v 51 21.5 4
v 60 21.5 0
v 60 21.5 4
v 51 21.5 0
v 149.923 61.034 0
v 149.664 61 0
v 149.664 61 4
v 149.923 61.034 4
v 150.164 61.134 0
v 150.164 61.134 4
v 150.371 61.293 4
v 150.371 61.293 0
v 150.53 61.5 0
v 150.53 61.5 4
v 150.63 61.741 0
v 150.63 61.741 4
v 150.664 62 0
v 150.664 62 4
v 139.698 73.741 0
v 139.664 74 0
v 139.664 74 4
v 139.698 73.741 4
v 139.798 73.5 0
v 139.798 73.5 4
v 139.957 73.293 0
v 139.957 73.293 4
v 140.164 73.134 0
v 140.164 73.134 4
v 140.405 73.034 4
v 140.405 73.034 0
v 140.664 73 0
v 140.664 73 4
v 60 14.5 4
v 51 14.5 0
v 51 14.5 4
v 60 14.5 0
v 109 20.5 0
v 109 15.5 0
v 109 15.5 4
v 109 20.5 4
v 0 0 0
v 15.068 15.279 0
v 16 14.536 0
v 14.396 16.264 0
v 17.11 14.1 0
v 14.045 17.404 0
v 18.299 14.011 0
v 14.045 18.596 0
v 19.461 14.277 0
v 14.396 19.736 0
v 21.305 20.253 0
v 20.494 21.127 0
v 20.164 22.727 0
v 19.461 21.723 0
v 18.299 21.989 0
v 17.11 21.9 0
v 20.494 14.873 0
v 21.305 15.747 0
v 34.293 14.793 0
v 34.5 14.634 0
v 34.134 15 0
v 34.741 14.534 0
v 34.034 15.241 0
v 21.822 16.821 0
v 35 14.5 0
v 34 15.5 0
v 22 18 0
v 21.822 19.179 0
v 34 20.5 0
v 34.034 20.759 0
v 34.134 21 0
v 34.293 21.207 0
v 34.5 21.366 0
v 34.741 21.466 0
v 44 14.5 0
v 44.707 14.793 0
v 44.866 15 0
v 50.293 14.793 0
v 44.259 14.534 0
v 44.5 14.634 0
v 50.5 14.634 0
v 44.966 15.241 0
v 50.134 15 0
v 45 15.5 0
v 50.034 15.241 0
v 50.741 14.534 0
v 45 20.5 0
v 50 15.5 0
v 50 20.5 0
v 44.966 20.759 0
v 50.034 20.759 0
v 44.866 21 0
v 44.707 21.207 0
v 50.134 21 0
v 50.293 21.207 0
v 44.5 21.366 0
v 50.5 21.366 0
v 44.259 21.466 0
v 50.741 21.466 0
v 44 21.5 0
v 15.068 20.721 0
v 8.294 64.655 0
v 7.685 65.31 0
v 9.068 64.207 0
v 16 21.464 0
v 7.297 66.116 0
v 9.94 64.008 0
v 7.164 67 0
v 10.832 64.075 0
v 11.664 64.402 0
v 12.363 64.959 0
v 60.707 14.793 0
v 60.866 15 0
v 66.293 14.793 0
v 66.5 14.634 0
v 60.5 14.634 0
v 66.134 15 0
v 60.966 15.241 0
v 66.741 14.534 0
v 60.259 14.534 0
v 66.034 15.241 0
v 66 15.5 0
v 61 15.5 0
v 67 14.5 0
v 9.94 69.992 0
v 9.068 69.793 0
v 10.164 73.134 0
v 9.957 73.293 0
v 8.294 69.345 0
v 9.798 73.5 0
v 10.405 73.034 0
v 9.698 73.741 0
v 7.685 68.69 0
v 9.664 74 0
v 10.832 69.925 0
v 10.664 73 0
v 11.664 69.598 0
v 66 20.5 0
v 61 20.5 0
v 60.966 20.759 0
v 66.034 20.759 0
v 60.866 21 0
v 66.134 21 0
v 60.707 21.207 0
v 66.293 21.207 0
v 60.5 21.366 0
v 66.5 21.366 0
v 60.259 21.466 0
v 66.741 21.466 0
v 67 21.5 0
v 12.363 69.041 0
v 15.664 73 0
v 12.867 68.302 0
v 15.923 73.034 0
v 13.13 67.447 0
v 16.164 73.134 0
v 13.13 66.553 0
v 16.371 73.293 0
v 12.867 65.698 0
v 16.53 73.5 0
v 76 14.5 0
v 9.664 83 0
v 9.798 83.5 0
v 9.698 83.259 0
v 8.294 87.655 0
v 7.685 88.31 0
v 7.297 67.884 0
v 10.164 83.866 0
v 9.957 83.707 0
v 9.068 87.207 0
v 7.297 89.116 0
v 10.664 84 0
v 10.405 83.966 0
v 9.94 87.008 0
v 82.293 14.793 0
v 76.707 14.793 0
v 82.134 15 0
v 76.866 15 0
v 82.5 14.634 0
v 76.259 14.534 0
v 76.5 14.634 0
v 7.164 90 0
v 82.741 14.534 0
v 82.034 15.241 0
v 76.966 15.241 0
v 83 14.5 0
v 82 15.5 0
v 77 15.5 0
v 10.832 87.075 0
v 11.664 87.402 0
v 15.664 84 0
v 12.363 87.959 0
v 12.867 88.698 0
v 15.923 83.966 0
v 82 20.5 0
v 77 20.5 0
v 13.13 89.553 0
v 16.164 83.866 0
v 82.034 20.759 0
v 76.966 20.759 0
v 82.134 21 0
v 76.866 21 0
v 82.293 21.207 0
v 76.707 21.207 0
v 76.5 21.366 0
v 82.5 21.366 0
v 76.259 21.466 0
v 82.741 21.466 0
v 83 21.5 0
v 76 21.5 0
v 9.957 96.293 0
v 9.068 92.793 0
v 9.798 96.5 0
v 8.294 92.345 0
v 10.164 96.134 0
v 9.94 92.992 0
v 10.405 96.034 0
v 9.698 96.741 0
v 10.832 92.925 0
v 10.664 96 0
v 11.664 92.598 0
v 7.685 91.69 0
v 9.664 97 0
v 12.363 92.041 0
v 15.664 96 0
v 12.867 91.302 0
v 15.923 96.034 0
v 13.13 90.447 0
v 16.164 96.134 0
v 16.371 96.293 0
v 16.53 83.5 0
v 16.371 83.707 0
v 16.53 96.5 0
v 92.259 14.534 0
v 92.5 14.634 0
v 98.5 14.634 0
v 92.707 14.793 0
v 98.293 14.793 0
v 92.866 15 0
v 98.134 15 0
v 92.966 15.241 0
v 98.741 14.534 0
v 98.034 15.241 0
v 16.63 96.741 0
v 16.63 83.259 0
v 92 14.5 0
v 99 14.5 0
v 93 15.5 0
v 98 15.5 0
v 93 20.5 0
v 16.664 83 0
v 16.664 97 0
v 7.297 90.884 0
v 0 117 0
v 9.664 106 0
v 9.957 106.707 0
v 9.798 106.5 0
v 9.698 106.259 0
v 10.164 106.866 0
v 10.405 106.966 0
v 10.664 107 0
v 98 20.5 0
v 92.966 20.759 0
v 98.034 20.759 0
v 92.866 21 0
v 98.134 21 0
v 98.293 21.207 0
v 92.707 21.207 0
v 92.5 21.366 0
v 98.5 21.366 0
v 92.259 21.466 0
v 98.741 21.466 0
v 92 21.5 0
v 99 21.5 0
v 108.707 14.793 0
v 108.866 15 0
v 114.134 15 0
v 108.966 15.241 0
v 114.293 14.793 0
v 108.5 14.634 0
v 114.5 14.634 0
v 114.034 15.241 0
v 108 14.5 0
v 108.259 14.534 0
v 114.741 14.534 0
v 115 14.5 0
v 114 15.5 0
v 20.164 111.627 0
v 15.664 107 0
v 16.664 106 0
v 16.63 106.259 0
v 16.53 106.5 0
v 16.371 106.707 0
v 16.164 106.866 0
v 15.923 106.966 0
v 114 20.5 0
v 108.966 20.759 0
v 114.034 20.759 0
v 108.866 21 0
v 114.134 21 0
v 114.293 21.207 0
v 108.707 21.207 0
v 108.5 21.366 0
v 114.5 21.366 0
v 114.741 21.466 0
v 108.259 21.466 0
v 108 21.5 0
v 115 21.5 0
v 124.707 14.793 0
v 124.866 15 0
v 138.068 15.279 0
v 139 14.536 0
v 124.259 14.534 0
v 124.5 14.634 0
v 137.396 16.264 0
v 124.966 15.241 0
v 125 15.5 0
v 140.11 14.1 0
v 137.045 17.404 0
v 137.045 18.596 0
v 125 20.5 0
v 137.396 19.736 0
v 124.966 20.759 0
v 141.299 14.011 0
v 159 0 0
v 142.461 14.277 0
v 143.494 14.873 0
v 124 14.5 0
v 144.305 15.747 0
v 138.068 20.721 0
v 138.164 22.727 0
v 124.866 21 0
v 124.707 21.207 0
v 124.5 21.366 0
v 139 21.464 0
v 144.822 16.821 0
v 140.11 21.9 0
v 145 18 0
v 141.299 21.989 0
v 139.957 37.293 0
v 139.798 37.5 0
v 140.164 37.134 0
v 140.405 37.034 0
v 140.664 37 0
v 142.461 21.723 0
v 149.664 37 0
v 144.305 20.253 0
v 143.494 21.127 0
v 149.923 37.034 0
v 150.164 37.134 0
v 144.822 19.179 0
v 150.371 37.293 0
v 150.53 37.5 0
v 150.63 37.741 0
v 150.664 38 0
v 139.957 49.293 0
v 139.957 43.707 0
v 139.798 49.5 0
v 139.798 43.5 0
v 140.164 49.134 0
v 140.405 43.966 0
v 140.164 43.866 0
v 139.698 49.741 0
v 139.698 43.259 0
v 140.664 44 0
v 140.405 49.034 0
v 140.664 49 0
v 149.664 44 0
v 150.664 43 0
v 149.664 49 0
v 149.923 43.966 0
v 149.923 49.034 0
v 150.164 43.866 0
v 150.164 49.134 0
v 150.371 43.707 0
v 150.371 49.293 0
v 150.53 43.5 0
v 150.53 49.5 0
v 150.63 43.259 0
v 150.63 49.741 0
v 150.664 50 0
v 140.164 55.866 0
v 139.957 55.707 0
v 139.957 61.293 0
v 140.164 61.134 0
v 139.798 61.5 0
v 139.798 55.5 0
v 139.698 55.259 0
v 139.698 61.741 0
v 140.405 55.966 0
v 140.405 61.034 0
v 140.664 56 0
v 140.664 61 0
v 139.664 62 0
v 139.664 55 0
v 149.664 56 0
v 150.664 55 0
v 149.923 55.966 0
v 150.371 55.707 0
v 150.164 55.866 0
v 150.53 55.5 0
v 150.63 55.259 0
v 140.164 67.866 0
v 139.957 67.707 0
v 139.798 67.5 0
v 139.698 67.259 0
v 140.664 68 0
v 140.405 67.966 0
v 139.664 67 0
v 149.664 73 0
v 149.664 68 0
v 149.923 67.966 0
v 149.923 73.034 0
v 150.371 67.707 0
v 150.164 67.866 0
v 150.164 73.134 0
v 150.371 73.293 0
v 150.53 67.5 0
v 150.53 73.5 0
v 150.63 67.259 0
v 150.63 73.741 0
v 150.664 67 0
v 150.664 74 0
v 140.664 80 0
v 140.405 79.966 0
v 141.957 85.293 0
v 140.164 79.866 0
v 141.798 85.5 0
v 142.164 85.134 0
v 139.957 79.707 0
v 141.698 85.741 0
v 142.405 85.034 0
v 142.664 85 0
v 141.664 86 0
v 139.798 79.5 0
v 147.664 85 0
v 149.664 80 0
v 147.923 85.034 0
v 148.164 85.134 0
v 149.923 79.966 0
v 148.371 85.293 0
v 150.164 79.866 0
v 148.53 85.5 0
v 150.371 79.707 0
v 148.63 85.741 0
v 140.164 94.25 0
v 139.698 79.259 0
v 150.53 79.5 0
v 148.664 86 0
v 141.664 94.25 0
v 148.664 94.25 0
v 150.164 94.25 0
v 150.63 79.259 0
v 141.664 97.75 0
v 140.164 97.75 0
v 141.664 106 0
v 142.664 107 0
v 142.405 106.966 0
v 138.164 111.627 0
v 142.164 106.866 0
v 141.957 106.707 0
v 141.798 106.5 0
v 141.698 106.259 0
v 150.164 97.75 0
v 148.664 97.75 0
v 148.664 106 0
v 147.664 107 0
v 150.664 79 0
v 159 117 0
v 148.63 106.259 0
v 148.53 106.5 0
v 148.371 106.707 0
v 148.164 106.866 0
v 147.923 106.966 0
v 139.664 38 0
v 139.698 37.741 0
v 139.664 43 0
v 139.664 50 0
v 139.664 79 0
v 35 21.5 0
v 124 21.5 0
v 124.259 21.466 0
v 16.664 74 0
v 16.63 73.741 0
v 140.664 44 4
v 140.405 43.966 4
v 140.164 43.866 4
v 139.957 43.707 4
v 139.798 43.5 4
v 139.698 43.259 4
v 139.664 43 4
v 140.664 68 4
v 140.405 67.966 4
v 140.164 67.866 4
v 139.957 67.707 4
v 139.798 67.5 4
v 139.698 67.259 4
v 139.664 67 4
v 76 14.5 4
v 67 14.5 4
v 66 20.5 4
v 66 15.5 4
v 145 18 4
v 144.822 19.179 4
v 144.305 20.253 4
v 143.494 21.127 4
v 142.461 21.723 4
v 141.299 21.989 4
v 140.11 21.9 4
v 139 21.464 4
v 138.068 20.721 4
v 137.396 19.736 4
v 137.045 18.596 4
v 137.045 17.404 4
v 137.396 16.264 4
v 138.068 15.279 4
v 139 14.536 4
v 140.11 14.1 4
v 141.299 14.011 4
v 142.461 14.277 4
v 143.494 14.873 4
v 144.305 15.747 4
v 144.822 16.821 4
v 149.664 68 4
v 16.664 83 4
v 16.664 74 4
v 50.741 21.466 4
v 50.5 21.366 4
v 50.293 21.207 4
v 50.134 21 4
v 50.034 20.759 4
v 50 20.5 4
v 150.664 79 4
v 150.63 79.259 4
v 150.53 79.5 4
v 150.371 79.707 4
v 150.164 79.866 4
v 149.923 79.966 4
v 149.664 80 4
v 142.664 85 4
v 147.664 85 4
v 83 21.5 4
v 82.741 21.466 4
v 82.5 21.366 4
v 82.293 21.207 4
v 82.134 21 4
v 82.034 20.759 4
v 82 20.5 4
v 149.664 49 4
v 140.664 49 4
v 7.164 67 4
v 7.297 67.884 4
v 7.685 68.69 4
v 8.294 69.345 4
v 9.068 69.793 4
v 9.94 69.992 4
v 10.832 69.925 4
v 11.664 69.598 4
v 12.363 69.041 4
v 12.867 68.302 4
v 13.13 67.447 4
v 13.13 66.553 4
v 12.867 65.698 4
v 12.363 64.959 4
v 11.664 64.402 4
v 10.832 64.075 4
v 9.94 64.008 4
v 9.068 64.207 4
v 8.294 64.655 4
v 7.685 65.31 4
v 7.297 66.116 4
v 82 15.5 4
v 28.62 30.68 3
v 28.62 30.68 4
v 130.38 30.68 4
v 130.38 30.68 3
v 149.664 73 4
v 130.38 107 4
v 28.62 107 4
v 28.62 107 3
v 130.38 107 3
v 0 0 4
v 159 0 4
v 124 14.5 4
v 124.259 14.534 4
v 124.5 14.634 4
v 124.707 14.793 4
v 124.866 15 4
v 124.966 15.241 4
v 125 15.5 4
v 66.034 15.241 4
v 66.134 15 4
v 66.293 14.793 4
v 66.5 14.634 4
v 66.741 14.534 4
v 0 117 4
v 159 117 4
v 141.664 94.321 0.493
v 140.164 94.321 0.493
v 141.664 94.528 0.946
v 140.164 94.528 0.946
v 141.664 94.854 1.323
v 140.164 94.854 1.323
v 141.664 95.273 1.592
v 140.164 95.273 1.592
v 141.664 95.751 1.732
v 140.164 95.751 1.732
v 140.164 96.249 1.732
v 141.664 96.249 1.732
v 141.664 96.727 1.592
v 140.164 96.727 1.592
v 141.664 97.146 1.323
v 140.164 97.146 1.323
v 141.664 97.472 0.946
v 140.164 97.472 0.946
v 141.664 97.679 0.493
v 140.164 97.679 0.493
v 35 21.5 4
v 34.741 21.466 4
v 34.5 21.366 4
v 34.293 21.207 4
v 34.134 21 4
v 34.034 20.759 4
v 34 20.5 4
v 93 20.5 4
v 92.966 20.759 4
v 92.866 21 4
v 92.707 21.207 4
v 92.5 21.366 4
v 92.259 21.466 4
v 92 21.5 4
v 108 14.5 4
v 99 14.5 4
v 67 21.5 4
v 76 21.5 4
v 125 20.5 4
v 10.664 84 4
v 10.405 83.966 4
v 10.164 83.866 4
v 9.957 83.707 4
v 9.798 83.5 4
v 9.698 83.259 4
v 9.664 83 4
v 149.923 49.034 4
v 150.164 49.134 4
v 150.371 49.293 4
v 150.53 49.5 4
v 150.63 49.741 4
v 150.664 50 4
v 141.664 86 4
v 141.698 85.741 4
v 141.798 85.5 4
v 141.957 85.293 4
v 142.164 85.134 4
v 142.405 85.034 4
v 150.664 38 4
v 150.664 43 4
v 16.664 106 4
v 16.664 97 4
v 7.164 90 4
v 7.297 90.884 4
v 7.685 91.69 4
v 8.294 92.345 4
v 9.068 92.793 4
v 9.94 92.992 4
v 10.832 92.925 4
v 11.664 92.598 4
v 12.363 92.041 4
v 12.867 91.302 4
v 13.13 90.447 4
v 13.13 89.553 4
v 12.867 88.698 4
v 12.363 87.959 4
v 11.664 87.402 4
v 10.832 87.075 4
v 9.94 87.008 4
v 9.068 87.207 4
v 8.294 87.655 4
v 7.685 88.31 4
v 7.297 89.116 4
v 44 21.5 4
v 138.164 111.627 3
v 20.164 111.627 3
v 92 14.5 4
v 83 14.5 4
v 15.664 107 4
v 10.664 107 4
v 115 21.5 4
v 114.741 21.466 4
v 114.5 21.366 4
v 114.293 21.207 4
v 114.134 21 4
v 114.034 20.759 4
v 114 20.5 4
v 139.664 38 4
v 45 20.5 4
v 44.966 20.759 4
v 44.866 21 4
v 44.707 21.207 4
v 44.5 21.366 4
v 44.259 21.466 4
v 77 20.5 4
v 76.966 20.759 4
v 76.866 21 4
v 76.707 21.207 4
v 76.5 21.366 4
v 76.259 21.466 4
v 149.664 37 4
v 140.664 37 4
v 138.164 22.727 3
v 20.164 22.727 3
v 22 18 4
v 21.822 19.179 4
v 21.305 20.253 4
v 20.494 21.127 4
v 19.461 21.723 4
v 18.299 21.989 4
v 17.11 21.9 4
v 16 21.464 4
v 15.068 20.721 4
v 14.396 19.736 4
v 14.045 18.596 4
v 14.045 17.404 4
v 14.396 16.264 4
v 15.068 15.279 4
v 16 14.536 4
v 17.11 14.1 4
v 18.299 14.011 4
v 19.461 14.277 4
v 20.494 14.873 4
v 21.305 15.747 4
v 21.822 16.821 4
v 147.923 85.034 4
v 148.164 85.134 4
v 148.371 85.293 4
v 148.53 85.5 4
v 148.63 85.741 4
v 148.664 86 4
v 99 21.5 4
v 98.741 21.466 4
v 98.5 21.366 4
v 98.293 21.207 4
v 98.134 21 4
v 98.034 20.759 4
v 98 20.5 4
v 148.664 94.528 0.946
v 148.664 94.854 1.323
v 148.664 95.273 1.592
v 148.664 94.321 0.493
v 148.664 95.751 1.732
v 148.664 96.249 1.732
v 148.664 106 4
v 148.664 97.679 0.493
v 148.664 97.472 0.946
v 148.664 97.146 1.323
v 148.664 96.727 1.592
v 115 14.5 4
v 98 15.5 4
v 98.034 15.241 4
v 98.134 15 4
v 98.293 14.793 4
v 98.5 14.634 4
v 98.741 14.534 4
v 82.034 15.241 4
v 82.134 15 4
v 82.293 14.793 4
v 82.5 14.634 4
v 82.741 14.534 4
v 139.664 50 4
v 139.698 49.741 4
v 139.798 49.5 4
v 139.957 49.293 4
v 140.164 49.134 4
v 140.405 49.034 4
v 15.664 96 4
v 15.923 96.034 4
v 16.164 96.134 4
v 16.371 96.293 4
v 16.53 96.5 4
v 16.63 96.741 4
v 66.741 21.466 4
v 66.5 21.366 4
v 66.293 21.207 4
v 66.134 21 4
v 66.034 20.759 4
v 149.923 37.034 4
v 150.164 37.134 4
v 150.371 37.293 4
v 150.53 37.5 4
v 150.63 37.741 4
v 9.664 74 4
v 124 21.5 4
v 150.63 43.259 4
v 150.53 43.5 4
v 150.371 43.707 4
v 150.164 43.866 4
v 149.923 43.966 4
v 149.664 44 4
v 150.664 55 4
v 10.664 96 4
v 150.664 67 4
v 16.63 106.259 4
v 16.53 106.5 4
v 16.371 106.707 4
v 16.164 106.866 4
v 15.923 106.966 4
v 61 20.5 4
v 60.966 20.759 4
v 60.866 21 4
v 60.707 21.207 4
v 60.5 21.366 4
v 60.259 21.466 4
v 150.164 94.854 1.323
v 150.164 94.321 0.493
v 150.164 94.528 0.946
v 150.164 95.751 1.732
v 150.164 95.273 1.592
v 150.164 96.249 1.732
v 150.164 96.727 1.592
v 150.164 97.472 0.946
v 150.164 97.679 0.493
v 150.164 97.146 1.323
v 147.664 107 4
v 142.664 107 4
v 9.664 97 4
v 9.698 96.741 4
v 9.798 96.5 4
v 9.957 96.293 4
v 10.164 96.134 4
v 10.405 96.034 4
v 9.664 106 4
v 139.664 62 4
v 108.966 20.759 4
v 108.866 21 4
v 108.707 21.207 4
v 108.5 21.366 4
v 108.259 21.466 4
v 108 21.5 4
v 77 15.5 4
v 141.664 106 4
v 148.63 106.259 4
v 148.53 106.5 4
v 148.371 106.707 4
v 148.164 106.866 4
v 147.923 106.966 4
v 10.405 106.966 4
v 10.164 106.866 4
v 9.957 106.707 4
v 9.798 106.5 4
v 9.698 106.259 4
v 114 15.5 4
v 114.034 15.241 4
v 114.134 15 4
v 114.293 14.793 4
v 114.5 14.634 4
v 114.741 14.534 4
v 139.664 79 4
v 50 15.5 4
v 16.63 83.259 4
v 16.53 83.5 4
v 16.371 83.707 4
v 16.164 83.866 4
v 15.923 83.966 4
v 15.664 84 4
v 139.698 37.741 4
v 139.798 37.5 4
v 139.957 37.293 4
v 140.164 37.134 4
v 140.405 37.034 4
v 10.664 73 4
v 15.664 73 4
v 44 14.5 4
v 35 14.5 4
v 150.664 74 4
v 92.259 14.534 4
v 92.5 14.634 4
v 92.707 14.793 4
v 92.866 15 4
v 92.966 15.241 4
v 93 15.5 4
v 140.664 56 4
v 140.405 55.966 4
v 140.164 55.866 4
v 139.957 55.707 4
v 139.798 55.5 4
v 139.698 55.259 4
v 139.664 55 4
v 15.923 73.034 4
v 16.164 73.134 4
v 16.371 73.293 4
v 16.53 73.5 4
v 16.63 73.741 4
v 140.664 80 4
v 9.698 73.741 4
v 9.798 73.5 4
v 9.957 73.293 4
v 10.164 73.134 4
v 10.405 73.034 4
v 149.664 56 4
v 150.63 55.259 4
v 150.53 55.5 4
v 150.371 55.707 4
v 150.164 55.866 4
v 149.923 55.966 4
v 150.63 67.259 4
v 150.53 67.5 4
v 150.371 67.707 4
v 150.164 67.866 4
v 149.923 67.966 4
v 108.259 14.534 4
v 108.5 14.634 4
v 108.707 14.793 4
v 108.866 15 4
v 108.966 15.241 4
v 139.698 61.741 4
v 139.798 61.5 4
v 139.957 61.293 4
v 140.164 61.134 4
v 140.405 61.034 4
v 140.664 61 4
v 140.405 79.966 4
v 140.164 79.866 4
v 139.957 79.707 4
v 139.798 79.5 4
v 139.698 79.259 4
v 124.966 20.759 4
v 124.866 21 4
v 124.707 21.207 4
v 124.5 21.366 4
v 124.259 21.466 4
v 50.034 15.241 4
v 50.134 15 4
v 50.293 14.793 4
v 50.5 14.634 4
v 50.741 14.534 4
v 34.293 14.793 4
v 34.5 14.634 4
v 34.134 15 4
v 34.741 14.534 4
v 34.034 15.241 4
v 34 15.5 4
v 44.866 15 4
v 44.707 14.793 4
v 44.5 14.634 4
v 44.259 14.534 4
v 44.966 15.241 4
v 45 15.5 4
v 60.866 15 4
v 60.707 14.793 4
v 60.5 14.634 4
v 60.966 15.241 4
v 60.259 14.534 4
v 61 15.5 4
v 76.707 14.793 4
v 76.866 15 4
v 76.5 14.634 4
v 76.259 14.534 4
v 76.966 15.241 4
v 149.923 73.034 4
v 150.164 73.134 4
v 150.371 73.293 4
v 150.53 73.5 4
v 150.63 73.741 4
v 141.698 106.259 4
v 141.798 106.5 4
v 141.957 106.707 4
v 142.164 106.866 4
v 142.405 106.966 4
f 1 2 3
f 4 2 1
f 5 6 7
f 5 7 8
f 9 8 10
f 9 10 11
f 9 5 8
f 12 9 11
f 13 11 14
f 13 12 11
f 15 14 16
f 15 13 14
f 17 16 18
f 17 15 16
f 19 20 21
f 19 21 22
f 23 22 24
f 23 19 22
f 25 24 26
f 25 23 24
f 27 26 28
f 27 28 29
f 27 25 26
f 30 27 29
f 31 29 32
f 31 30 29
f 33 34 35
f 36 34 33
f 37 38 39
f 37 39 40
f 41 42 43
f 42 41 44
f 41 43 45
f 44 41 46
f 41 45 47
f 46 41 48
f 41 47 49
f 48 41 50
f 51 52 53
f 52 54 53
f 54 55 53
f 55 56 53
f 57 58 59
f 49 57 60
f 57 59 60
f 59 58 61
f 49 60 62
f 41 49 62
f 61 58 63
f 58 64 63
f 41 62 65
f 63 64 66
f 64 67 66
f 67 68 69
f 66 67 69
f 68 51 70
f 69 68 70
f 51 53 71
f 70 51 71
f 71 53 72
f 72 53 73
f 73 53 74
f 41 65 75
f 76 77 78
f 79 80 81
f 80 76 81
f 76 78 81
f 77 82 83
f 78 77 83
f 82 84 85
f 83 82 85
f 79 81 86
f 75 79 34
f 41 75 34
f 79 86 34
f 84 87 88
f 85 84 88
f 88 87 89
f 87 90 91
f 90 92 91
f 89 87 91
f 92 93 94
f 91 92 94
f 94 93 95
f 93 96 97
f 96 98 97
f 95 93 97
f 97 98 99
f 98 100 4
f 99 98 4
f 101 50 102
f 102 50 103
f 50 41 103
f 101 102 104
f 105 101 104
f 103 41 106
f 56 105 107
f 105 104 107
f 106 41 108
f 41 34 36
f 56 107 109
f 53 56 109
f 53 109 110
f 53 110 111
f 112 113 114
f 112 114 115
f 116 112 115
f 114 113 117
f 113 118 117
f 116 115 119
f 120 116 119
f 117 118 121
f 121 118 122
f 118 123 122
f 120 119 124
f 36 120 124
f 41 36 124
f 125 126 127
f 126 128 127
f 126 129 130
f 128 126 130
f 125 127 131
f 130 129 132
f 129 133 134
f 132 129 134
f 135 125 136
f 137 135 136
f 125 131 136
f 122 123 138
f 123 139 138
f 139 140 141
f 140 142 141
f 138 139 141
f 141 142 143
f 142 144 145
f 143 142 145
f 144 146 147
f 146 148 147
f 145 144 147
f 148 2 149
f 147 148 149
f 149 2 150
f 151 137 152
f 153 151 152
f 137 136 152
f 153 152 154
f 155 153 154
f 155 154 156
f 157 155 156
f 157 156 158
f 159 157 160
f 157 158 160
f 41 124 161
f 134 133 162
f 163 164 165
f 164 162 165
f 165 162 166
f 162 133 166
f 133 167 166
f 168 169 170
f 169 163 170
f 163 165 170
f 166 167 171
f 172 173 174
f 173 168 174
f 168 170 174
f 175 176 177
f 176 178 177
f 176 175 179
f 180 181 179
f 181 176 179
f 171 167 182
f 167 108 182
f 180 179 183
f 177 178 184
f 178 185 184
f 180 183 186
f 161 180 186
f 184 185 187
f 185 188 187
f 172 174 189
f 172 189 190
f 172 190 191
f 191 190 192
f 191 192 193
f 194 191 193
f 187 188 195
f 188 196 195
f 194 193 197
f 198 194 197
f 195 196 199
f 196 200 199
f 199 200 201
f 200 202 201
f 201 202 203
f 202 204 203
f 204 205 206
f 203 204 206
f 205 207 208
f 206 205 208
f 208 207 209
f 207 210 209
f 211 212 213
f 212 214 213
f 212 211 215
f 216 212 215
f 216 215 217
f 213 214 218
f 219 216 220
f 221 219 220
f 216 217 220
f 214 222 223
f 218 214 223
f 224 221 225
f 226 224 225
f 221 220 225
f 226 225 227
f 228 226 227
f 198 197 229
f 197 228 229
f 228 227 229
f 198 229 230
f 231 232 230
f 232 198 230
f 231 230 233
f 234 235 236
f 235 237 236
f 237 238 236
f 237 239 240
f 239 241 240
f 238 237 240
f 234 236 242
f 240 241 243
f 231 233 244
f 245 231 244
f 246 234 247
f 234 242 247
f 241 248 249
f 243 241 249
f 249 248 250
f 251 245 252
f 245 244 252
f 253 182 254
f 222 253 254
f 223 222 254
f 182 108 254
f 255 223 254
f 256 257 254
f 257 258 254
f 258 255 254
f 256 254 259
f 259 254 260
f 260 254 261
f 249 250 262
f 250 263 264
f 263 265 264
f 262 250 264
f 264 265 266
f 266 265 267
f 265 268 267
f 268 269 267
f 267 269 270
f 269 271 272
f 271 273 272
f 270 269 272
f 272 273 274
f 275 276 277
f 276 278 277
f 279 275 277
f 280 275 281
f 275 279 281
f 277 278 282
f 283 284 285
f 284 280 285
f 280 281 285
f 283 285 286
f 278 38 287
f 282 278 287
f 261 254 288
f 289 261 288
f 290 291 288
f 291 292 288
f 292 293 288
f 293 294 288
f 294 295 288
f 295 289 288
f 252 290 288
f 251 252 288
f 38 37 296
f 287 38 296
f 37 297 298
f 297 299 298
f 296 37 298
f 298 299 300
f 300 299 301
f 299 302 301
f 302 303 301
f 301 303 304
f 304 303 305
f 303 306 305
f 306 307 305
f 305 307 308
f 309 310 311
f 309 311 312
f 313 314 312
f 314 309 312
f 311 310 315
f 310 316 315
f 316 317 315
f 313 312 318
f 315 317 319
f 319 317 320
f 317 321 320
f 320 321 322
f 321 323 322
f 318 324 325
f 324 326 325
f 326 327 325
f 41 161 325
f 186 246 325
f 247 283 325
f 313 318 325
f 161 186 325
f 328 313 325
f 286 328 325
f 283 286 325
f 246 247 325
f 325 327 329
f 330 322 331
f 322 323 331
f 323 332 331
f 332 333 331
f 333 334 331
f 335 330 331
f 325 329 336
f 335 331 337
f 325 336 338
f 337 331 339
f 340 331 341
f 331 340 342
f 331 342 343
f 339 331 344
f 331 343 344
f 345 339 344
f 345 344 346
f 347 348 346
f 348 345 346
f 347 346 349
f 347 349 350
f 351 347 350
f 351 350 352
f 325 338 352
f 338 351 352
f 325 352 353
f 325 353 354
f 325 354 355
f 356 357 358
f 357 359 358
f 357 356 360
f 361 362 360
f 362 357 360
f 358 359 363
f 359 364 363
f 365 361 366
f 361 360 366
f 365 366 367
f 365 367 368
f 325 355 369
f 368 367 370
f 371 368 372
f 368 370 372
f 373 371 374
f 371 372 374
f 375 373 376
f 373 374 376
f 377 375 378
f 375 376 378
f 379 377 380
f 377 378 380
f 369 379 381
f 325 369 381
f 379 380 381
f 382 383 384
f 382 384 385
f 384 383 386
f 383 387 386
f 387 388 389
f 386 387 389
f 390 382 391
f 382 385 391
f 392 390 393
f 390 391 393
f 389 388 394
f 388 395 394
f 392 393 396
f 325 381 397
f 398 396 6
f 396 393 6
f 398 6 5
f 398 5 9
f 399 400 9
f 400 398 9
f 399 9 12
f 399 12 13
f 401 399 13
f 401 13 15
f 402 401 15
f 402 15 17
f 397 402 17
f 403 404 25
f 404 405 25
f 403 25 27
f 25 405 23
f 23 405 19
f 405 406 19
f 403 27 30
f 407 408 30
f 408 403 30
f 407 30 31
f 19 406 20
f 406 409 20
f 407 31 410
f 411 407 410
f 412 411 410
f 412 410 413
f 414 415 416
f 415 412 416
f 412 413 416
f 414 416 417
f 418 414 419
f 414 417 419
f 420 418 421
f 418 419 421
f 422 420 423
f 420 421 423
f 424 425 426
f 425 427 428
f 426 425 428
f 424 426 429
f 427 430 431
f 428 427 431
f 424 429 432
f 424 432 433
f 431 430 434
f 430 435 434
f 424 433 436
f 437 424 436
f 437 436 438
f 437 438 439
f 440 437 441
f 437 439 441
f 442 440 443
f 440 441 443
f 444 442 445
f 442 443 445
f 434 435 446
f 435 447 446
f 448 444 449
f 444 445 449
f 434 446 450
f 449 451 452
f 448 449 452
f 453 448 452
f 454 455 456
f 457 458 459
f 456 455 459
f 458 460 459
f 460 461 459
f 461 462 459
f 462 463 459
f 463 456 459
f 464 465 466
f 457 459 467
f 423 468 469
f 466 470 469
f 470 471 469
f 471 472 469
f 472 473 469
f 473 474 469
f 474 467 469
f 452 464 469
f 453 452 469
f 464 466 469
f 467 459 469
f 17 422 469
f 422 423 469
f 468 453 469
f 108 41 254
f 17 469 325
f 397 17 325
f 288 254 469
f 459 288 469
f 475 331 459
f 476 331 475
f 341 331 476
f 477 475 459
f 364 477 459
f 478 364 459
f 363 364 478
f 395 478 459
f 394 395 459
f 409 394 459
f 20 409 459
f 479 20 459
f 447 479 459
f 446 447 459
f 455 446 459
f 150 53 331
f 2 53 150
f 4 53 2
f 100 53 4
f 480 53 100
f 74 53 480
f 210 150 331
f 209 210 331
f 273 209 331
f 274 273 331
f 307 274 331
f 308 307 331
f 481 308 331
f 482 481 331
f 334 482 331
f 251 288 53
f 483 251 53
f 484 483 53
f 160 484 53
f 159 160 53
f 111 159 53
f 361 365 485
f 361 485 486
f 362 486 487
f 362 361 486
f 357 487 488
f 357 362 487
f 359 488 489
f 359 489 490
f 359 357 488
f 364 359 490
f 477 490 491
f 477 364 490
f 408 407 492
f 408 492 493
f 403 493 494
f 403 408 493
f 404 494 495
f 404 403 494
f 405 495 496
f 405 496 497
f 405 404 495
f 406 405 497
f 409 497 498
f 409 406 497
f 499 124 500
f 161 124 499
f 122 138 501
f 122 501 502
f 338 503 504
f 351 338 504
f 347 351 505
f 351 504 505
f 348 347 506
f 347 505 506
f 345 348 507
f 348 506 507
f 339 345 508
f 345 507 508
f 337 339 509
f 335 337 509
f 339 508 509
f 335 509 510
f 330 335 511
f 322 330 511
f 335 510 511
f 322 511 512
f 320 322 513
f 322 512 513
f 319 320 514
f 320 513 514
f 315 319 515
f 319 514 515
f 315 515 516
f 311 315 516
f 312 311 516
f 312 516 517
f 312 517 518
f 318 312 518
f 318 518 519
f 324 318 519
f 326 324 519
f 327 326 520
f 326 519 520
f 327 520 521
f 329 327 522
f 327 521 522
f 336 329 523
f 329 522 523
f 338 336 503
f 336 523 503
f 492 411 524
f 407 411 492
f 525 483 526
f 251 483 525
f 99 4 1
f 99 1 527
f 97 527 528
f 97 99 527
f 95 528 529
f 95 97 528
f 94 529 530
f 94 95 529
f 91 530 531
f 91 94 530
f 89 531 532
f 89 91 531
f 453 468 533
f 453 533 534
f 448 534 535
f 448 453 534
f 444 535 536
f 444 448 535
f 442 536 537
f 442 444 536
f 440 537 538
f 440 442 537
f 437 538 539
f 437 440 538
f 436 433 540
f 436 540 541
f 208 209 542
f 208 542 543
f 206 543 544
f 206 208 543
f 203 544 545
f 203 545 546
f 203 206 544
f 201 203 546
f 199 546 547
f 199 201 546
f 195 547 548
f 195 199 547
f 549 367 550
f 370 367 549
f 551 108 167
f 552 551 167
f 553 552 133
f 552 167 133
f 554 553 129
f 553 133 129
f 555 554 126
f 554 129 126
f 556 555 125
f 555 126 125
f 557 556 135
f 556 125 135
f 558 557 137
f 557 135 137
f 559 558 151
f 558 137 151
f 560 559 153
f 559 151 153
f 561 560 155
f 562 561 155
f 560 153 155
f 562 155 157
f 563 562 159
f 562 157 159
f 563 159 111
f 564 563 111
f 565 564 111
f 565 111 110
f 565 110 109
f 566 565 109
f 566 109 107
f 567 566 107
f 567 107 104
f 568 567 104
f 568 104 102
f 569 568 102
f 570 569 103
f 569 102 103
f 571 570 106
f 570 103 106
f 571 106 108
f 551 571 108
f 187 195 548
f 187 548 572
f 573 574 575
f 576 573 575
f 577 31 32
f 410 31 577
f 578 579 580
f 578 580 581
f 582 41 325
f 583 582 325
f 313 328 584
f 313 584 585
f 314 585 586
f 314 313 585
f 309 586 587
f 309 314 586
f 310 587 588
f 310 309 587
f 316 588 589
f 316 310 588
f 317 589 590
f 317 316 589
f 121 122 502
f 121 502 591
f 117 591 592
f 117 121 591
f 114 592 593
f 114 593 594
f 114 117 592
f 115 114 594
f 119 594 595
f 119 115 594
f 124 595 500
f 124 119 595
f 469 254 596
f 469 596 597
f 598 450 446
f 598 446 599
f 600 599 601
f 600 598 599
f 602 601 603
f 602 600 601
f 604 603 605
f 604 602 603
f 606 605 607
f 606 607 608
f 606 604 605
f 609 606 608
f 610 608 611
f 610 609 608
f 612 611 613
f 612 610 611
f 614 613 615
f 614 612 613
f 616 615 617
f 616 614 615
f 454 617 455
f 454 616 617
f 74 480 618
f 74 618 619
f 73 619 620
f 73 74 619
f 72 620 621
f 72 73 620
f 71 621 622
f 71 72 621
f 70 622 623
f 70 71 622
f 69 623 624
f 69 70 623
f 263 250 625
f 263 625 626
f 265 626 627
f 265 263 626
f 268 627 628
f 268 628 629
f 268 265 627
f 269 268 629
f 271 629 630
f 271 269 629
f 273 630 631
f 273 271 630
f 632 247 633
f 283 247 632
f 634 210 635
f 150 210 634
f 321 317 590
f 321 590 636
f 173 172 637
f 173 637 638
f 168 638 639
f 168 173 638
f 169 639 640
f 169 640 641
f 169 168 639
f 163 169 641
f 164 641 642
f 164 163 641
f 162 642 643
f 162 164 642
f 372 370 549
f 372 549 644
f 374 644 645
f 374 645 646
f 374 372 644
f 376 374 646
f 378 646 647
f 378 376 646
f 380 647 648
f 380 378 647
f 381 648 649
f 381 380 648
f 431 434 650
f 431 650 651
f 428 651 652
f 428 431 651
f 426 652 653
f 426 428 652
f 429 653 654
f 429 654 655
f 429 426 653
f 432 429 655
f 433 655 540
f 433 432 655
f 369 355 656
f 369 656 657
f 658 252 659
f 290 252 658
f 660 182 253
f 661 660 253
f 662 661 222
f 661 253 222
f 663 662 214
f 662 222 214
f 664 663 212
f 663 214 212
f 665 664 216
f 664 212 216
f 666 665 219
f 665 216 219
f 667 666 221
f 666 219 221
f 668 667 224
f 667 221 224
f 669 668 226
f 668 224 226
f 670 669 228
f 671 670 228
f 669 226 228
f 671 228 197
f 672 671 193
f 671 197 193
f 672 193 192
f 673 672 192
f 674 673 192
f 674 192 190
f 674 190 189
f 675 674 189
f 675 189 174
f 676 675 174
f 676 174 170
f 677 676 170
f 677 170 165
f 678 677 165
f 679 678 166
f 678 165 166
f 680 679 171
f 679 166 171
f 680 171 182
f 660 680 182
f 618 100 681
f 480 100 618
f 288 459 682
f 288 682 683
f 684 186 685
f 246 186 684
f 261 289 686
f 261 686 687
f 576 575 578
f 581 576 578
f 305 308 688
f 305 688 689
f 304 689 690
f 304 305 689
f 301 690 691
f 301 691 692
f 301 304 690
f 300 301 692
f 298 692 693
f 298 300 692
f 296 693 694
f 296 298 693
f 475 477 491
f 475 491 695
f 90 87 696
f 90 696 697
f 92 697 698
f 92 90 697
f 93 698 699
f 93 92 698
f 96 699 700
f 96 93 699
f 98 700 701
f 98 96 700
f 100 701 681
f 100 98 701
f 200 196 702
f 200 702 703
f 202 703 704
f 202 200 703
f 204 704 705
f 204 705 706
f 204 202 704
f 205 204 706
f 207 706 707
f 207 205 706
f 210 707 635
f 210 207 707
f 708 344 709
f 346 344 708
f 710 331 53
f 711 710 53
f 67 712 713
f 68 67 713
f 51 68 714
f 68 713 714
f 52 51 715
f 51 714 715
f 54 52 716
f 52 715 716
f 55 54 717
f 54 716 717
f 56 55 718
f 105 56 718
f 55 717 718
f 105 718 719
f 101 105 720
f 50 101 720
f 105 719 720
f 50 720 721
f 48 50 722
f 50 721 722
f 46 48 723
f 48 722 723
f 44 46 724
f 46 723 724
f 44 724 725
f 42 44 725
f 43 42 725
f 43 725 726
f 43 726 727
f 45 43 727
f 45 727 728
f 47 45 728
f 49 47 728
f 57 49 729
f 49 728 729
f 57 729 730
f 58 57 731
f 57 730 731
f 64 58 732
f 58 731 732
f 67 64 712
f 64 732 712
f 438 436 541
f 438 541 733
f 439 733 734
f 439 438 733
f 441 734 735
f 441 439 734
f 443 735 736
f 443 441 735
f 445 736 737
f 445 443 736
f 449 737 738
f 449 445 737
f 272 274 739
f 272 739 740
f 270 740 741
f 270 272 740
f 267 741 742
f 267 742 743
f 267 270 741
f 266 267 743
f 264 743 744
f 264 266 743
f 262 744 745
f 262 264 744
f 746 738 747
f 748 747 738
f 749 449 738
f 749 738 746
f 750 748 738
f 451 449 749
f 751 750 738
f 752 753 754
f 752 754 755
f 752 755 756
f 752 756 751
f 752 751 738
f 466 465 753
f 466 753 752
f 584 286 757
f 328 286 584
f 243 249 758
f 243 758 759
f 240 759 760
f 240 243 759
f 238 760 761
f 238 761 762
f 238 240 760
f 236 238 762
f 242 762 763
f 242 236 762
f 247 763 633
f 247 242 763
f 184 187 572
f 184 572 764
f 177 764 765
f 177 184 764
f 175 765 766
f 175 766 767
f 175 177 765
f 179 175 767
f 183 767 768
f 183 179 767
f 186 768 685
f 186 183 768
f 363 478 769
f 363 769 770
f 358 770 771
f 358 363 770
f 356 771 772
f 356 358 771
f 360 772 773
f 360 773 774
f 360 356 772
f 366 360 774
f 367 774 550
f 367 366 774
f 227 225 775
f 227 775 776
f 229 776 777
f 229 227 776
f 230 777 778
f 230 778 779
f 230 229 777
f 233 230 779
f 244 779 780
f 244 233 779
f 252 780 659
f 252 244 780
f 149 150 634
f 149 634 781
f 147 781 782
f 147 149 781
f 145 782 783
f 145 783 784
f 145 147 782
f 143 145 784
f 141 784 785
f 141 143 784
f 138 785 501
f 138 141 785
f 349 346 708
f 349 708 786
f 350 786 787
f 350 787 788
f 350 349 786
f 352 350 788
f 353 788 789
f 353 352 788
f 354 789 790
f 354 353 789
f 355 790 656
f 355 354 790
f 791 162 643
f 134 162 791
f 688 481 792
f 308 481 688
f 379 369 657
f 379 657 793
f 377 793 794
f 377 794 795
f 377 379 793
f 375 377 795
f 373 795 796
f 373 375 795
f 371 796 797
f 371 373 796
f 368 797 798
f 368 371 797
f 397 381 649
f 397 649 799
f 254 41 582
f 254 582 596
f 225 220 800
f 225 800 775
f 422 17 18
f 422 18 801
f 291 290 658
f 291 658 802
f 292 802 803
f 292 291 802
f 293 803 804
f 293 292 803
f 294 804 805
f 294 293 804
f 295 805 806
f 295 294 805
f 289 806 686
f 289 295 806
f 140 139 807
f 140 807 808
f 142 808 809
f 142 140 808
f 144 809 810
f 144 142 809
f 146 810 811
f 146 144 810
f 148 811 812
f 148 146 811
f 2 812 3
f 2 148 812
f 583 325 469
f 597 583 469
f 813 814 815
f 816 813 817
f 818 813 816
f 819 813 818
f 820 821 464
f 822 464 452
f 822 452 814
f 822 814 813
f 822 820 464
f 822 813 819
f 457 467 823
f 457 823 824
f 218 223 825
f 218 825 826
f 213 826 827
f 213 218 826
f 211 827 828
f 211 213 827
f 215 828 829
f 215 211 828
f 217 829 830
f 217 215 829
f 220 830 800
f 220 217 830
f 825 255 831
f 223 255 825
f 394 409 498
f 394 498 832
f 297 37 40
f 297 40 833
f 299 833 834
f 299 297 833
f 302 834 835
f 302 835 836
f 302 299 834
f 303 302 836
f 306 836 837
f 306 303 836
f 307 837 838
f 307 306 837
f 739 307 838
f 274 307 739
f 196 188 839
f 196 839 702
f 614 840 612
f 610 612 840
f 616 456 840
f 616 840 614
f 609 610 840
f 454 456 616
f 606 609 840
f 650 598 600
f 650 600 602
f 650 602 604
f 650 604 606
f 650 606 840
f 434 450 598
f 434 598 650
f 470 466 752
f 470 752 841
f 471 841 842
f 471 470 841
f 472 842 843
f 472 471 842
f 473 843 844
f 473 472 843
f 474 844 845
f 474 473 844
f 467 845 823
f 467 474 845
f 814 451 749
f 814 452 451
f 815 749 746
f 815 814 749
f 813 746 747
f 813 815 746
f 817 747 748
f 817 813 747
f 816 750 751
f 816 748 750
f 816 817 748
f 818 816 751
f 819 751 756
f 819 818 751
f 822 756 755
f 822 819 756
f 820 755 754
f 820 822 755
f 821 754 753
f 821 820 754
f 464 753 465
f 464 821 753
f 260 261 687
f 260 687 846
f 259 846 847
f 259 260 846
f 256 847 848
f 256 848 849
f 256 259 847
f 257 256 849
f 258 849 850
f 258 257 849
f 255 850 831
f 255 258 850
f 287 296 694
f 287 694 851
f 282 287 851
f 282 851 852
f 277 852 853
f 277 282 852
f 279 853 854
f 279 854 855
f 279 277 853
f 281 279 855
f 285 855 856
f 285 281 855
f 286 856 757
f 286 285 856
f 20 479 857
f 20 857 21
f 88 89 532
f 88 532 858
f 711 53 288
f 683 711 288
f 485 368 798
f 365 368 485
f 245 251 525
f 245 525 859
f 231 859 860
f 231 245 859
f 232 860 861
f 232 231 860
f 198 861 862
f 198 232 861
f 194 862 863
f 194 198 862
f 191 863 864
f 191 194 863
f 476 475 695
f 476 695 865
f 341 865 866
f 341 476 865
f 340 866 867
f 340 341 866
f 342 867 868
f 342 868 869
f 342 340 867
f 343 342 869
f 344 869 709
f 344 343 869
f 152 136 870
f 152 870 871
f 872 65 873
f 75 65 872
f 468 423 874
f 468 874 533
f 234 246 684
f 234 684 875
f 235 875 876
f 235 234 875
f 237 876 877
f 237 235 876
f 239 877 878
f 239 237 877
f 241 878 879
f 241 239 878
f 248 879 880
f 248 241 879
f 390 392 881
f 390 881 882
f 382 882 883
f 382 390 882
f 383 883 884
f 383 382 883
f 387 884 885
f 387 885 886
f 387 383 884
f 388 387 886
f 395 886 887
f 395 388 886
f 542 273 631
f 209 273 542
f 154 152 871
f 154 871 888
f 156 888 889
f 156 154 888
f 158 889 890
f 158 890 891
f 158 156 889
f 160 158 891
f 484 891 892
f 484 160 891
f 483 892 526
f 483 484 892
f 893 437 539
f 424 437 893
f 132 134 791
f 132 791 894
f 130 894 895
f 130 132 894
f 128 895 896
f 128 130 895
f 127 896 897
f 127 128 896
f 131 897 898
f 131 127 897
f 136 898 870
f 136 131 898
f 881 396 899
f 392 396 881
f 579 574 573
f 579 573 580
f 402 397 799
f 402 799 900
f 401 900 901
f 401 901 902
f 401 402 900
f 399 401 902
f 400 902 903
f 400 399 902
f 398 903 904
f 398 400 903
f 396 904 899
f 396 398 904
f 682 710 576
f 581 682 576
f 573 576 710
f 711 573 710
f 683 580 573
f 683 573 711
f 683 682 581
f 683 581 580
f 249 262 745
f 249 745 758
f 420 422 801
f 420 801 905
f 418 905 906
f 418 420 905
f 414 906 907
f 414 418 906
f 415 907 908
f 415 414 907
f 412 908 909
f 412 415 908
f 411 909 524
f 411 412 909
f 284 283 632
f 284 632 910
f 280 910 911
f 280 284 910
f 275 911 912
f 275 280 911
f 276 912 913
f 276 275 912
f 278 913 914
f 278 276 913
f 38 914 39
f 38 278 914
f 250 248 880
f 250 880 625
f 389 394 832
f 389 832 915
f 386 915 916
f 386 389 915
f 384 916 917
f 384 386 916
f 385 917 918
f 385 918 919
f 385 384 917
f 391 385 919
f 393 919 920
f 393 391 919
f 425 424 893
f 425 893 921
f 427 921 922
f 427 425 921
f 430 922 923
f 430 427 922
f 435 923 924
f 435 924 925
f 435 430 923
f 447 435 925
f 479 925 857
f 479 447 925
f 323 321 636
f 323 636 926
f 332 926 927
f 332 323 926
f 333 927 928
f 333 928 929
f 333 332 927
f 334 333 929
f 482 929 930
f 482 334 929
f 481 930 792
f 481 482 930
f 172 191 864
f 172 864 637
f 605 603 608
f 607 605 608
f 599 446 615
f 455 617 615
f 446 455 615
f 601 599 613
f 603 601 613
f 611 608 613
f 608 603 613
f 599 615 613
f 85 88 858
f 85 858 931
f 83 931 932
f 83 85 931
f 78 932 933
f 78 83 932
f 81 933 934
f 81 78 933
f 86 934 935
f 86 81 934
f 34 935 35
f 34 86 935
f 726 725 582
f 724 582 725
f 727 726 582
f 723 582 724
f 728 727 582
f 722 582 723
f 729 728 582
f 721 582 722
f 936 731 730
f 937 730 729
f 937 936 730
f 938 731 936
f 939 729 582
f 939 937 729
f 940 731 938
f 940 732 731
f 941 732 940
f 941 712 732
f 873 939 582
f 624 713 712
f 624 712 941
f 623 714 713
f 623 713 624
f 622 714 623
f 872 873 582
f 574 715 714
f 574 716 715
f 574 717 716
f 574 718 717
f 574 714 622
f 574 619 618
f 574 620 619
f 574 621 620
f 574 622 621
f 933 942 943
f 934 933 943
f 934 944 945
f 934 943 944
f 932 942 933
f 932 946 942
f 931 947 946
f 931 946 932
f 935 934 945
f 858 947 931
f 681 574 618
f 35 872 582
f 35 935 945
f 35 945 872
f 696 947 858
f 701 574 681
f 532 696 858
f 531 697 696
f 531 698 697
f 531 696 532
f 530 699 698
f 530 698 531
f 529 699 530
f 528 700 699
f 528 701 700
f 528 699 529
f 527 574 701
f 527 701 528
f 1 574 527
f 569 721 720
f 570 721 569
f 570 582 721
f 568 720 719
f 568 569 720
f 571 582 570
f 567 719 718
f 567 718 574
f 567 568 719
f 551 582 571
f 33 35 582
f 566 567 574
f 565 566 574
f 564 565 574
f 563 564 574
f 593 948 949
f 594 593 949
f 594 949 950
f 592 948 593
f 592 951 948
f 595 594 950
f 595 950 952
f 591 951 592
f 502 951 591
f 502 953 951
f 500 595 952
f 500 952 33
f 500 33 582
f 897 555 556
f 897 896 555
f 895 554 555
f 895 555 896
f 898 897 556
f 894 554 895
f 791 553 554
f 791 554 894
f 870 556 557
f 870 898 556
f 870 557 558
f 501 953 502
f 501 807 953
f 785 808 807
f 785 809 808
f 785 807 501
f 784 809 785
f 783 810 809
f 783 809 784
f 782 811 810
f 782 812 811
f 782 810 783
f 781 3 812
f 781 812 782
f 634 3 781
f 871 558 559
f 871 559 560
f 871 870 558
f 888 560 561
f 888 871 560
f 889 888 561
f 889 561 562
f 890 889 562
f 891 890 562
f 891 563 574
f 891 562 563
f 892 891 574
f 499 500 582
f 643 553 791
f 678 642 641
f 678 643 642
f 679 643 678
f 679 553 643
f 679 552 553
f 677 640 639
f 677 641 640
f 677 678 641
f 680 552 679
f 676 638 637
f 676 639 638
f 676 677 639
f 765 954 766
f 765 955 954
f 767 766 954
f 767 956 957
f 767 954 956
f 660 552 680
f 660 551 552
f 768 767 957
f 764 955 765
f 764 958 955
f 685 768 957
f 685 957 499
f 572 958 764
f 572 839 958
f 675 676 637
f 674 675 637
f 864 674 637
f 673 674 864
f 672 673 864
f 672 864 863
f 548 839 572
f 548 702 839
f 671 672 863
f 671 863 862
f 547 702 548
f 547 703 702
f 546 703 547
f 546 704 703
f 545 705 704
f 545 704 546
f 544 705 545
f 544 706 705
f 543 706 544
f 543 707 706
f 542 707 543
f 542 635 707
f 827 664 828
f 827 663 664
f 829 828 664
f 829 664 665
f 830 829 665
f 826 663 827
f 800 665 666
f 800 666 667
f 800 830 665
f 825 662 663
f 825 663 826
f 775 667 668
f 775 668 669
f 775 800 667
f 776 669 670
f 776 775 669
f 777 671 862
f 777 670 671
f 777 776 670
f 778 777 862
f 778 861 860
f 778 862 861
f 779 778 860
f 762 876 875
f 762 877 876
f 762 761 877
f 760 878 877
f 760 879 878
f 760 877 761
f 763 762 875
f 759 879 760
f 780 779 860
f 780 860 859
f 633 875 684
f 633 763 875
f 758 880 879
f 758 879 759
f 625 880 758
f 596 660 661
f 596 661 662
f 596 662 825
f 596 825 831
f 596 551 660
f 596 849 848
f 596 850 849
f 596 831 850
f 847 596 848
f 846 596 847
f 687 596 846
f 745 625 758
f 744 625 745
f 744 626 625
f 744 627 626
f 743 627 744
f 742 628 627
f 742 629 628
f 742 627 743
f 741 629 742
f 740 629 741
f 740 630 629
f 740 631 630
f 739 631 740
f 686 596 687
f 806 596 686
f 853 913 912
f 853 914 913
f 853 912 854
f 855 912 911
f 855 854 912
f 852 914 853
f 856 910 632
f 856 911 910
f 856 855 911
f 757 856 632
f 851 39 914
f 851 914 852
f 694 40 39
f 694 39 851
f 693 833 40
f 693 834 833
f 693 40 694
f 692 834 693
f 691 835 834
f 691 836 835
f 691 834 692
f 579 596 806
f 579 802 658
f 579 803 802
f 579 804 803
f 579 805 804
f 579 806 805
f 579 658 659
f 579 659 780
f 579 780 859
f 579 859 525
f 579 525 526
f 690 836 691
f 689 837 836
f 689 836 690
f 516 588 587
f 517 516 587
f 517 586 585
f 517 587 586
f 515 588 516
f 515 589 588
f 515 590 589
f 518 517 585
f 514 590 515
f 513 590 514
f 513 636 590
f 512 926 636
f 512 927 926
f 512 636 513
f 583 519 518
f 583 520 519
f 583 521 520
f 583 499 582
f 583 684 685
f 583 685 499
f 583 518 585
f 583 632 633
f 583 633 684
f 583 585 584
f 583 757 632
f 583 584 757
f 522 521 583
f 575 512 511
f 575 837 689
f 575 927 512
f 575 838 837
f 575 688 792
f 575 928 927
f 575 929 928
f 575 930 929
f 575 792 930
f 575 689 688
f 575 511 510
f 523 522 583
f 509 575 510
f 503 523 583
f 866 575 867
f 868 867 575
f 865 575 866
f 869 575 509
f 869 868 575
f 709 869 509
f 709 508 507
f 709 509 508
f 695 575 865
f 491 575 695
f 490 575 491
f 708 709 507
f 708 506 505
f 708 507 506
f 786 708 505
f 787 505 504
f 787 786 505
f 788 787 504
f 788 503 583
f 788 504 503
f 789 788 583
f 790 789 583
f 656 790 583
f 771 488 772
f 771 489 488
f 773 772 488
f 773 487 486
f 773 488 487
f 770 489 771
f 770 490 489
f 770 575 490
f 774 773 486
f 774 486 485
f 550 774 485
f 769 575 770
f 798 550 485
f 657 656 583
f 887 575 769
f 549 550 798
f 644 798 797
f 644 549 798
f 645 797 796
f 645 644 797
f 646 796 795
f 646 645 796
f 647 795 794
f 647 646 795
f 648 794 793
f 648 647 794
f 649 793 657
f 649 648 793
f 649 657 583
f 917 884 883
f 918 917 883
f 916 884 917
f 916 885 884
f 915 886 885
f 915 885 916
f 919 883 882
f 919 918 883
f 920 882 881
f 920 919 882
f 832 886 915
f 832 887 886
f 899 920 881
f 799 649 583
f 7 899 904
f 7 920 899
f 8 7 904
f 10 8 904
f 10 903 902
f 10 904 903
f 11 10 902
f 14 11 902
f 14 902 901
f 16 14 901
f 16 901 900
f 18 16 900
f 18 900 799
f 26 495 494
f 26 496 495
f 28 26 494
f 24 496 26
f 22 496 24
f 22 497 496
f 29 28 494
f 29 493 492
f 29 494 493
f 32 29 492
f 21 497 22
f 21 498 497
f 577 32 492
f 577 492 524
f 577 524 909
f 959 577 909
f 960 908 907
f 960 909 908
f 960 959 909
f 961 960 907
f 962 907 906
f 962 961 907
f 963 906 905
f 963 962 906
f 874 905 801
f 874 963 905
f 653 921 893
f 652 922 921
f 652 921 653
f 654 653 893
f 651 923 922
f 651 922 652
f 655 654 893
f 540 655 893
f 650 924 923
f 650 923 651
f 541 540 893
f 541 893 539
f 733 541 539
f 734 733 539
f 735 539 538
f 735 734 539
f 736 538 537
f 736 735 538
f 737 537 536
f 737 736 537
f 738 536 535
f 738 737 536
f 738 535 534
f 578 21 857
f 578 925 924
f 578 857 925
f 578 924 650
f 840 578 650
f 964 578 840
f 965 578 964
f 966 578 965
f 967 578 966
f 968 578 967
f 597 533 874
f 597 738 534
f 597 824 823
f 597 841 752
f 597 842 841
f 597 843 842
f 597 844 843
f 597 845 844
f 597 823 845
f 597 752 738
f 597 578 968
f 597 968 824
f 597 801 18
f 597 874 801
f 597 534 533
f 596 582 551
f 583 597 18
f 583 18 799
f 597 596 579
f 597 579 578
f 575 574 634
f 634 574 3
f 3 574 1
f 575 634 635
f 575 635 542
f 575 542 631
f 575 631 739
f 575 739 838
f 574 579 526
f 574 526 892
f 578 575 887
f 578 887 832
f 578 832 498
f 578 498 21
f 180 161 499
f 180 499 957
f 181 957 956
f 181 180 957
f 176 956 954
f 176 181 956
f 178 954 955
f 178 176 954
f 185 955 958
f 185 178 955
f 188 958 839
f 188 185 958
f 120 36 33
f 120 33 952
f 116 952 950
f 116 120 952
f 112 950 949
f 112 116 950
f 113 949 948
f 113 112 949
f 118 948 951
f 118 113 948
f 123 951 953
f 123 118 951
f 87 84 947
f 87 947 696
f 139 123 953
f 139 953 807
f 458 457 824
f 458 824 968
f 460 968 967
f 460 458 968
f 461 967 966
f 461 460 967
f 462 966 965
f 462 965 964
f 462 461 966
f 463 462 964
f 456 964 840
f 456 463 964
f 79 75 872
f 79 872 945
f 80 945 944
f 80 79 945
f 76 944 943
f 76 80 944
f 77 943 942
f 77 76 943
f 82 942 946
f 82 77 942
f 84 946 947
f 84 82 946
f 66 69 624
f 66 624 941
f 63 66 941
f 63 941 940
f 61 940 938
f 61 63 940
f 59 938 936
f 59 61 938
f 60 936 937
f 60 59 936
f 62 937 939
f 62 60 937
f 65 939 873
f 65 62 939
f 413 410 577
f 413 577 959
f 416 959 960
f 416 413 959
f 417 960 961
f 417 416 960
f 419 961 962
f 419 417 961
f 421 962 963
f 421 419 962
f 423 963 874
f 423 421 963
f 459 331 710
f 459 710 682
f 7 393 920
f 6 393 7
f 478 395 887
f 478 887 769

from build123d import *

# Parameters (mm, degrees)
ESQUISSE1_W                  = 159
ESQUISSE1_H                  = 117
BOSS_EXTRU_1_DEPTH           = 4
ESQUISSE3_W                  = 101.76
ESQUISSE3_H                  = 76.32
ENL_V_MAT_EXTRU_2_DEPTH      = 4
ESQUISSE9_W                  = 118
ESQUISSE9_H                  = 88.9
ENL_V_MAT_EXTRU_5_DEPTH      = 3
ESQUISSE4_R                  = 4
ENL_V_MAT_EXTRU_3_DEPTH      = 4
ESQUISSE10_R                 = 3
ENL_V_MAT_EXTRU_6_DEPTH      = 4
ENL_V_MAT_EXTRU_7_DEPTH      = 8.5
ENL_V_MAT_EXTRU_7_DEPTH_BACK = 1.5
ESQUISSE11_R                 = 1.75


with BuildPart() as part:
    # Esquisse1 → Boss.-Extru.1 (new body)
    with BuildSketch(Plane.XY):
        with Locations((79.5, 58.5)):
            Rectangle(ESQUISSE1_W, ESQUISSE1_H)
    extrude(amount=BOSS_EXTRU_1_DEPTH)

    # Esquisse3 → Enlèv. mat.-Extru.2 (cut)
    with BuildSketch(Plane.XY.offset(4)):
        with Locations((79.5, 68.84)):
            Rectangle(ESQUISSE3_W, ESQUISSE3_H)
    extrude(amount=-ENL_V_MAT_EXTRU_2_DEPTH, mode=Mode.SUBTRACT)

    # Esquisse9 → Enlèv. mat.-Extru.5 (cut)
    with BuildSketch(Plane(origin=(0, 0, 0), x_dir=(-1, 0, 0), z_dir=(0, 0, -1))):
        with Locations((-79.163992303, 67.176625881)):
            Rectangle(ESQUISSE9_W, ESQUISSE9_H)
    extrude(amount=-ENL_V_MAT_EXTRU_5_DEPTH, mode=Mode.SUBTRACT)

    # Esquisse4 → Enlèv. mat.-Extru.3 (cut)
    with BuildSketch(Plane.XY.offset(4)):
        with Locations((141, 18)):
            Circle(ESQUISSE4_R)
        with Locations((18, 18)):
            Circle(ESQUISSE4_R)
    extrude(amount=-ENL_V_MAT_EXTRU_3_DEPTH, mode=Mode.SUBTRACT)

    # Esquisse10 → Enlèv. mat.-Extru.6 (cut)
    with BuildSketch(Plane(origin=(0, 0, 0), x_dir=(-1, 0, 0), z_dir=(0, 0, -1))):
        with Locations((-10.163992303, 90)):
            Circle(ESQUISSE10_R)
        with Locations((-10.163992303, 67)):
            Circle(ESQUISSE10_R)
        with BuildLine():
            Line((-124, 21.5), (-115, 21.5))
            ThreePointArc((-115, 21.5), (-114.292893219, 21.207106781), (-114, 20.5))
            Line((-114, 20.5), (-114, 15.5))
            ThreePointArc((-114, 15.5), (-114.292893219, 14.792893219), (-115, 14.5))
            Line((-115, 14.5), (-124, 14.5))
            ThreePointArc((-124, 14.5), (-124.707106781, 14.792893219), (-125, 15.5))
            Line((-125, 15.5), (-125, 20.5))
            ThreePointArc((-125, 20.5), (-124.707106781, 21.207106781), (-124, 21.5))
        make_face()
        with BuildLine():
            Line((-108, 21.5), (-99, 21.5))
            ThreePointArc((-99, 21.5), (-98.292893219, 21.207106781), (-98, 20.5))
            Line((-98, 20.5), (-98, 15.5))
            ThreePointArc((-98, 15.5), (-98.292893219, 14.792893219), (-99, 14.5))
            Line((-99, 14.5), (-108, 14.5))
            ThreePointArc((-108, 14.5), (-108.707106781, 14.792893219), (-109, 15.5))
            Line((-109, 15.5), (-109, 20.5))
            ThreePointArc((-109, 20.5), (-108.707106781, 21.207106781), (-108, 21.5))
        make_face()
        with BuildLine():
            Line((-92, 21.5), (-83, 21.5))
            ThreePointArc((-83, 21.5), (-82.292893219, 21.207106781), (-82, 20.5))
            Line((-82, 20.5), (-82, 15.5))
            ThreePointArc((-82, 15.5), (-82.292893219, 14.792893219), (-83, 14.5))
            Line((-83, 14.5), (-92, 14.5))
            ThreePointArc((-92, 14.5), (-92.707106781, 14.792893219), (-93, 15.5))
            Line((-93, 15.5), (-93, 20.5))
            ThreePointArc((-93, 20.5), (-92.707106781, 21.207106781), (-92, 21.5))
        make_face()
        with BuildLine():
            Line((-76, 21.5), (-67, 21.5))
            ThreePointArc((-67, 21.5), (-66.292893219, 21.207106781), (-66, 20.5))
            Line((-66, 20.5), (-66, 15.5))
            ThreePointArc((-66, 15.5), (-66.292893219, 14.792893219), (-67, 14.5))
            Line((-67, 14.5), (-76, 14.5))
            ThreePointArc((-76, 14.5), (-76.707106781, 14.792893219), (-77, 15.5))
            Line((-77, 15.5), (-77, 20.5))
            ThreePointArc((-77, 20.5), (-76.707106781, 21.207106781), (-76, 21.5))
        make_face()
        with BuildLine():
            Line((-60, 21.5), (-51, 21.5))
            ThreePointArc((-51, 21.5), (-50.292893219, 21.207106781), (-50, 20.5))
            Line((-50, 20.5), (-50, 15.5))
            ThreePointArc((-50, 15.5), (-50.292893219, 14.792893219), (-51, 14.5))
            Line((-51, 14.5), (-60, 14.5))
            ThreePointArc((-60, 14.5), (-60.707106781, 14.792893219), (-61, 15.5))
            Line((-61, 15.5), (-61, 20.5))
            ThreePointArc((-61, 20.5), (-60.707106781, 21.207106781), (-60, 21.5))
        make_face()
        with BuildLine():
            Line((-44, 21.5), (-35, 21.5))
            ThreePointArc((-35, 21.5), (-34.292893219, 21.207106781), (-34, 20.5))
            Line((-34, 20.5), (-34, 15.5))
            ThreePointArc((-34, 15.5), (-34.292893219, 14.792893219), (-35, 14.5))
            Line((-35, 14.5), (-44, 14.5))
            ThreePointArc((-44, 14.5), (-44.707106781, 14.792893219), (-45, 15.5))
            Line((-45, 15.5), (-45, 20.5))
            ThreePointArc((-45, 20.5), (-44.707106781, 21.207106781), (-44, 21.5))
        make_face()
        with BuildLine():
            Line((-147.663992303, 107), (-142.663992303, 107))
            ThreePointArc((-142.663992303, 107), (-141.956885522, 106.707106781), (-141.663992303, 106))
            Line((-141.663992303, 106), (-141.663992303, 86))
            ThreePointArc((-141.663992303, 86), (-141.956885522, 85.292893219), (-142.663992303, 85))
            Line((-142.663992303, 85), (-147.663992303, 85))
            ThreePointArc((-147.663992303, 85), (-148.371099084, 85.292893219), (-148.663992303, 86))
            Line((-148.663992303, 86), (-148.663992303, 106))
            ThreePointArc((-148.663992303, 106), (-148.371099084, 106.707106781), (-147.663992303, 107))
        make_face()
        with BuildLine():
            Line((-149.663992303, 80), (-140.663992303, 80))
            ThreePointArc((-140.663992303, 80), (-139.956885522, 79.707106781), (-139.663992303, 79))
            Line((-139.663992303, 79), (-139.663992303, 74))
            ThreePointArc((-139.663992303, 74), (-139.956885522, 73.292893219), (-140.663992303, 73))
            Line((-140.663992303, 73), (-149.663992303, 73))
            ThreePointArc((-149.663992303, 73), (-150.371099084, 73.292893219), (-150.663992303, 74))
            Line((-150.663992303, 74), (-150.663992303, 79))
            ThreePointArc((-150.663992303, 79), (-150.371099084, 79.707106781), (-149.663992303, 80))
        make_face()
        with BuildLine():
            Line((-149.663992303, 68), (-140.663992303, 68))
            ThreePointArc((-140.663992303, 68), (-139.956885522, 67.707106781), (-139.663992303, 67))
            Line((-139.663992303, 67), (-139.663992303, 62))
            ThreePointArc((-139.663992303, 62), (-139.956885522, 61.292893219), (-140.663992303, 61))
            Line((-140.663992303, 61), (-149.663992303, 61))
            ThreePointArc((-149.663992303, 61), (-150.371099084, 61.292893219), (-150.663992303, 62))
            Line((-150.663992303, 62), (-150.663992303, 67))
            ThreePointArc((-150.663992303, 67), (-150.371099084, 67.707106781), (-149.663992303, 68))
        make_face()
        with BuildLine():
            Line((-149.663992303, 56), (-140.663992303, 56))
            ThreePointArc((-140.663992303, 56), (-139.956885522, 55.707106781), (-139.663992303, 55))
            Line((-139.663992303, 55), (-139.663992303, 50))
            ThreePointArc((-139.663992303, 50), (-139.956885522, 49.292893219), (-140.663992303, 49))
            Line((-140.663992303, 49), (-149.663992303, 49))
            ThreePointArc((-149.663992303, 49), (-150.371099084, 49.292893219), (-150.663992303, 50))
            Line((-150.663992303, 50), (-150.663992303, 55))
            ThreePointArc((-150.663992303, 55), (-150.371099084, 55.707106781), (-149.663992303, 56))
        make_face()
        with BuildLine():
            Line((-149.663992303, 44), (-140.663992303, 44))
            ThreePointArc((-140.663992303, 44), (-139.956885522, 43.707106781), (-139.663992303, 43))
            Line((-139.663992303, 43), (-139.663992303, 38))
            ThreePointArc((-139.663992303, 38), (-139.956885522, 37.292893219), (-140.663992303, 37))
            Line((-140.663992303, 37), (-149.663992303, 37))
            ThreePointArc((-149.663992303, 37), (-150.371099084, 37.292893219), (-150.663992303, 38))
            Line((-150.663992303, 38), (-150.663992303, 43))
            ThreePointArc((-150.663992303, 43), (-150.371099084, 43.707106781), (-149.663992303, 44))
        make_face()
        with BuildLine():
            Line((-15.663992303, 107), (-10.663992303, 107))
            ThreePointArc((-10.663992303, 107), (-9.956885522, 106.707106781), (-9.663992303, 106))
            Line((-9.663992303, 106), (-9.663992303, 97))
            ThreePointArc((-9.663992303, 97), (-9.956885522, 96.292893219), (-10.663992303, 96))
            Line((-10.663992303, 96), (-15.663992303, 96))
            ThreePointArc((-15.663992303, 96), (-16.371099084, 96.292893219), (-16.663992303, 97))
            Line((-16.663992303, 97), (-16.663992303, 106))
            ThreePointArc((-16.663992303, 106), (-16.371099084, 106.707106781), (-15.663992303, 107))
        make_face()
        with BuildLine():
            Line((-15.663992303, 84), (-10.663992303, 84))
            ThreePointArc((-10.663992303, 84), (-9.956885522, 83.707106781), (-9.663992303, 83))
            Line((-9.663992303, 83), (-9.663992303, 74))
            ThreePointArc((-9.663992303, 74), (-9.956885522, 73.292893219), (-10.663992303, 73))
            Line((-10.663992303, 73), (-15.663992303, 73))
            ThreePointArc((-15.663992303, 73), (-16.371099084, 73.292893219), (-16.663992303, 74))
            Line((-16.663992303, 74), (-16.663992303, 83))
            ThreePointArc((-16.663992303, 83), (-16.371099084, 83.707106781), (-15.663992303, 84))
        make_face()
    extrude(amount=-ENL_V_MAT_EXTRU_6_DEPTH, mode=Mode.SUBTRACT)

    # Esquisse11 → Enlèv. mat.-Extru.7 (cut, two sides: drawn at the far end of the back side and taken through both)
    with BuildSketch(Plane.ZY.offset(-148.663992303).offset(-ENL_V_MAT_EXTRU_7_DEPTH_BACK)):
        with Locations((0, 96)):
            Circle(ESQUISSE11_R)
    extrude(amount=ENL_V_MAT_EXTRU_7_DEPTH + ENL_V_MAT_EXTRU_7_DEPTH_BACK, mode=Mode.SUBTRACT)


solid = part.part
